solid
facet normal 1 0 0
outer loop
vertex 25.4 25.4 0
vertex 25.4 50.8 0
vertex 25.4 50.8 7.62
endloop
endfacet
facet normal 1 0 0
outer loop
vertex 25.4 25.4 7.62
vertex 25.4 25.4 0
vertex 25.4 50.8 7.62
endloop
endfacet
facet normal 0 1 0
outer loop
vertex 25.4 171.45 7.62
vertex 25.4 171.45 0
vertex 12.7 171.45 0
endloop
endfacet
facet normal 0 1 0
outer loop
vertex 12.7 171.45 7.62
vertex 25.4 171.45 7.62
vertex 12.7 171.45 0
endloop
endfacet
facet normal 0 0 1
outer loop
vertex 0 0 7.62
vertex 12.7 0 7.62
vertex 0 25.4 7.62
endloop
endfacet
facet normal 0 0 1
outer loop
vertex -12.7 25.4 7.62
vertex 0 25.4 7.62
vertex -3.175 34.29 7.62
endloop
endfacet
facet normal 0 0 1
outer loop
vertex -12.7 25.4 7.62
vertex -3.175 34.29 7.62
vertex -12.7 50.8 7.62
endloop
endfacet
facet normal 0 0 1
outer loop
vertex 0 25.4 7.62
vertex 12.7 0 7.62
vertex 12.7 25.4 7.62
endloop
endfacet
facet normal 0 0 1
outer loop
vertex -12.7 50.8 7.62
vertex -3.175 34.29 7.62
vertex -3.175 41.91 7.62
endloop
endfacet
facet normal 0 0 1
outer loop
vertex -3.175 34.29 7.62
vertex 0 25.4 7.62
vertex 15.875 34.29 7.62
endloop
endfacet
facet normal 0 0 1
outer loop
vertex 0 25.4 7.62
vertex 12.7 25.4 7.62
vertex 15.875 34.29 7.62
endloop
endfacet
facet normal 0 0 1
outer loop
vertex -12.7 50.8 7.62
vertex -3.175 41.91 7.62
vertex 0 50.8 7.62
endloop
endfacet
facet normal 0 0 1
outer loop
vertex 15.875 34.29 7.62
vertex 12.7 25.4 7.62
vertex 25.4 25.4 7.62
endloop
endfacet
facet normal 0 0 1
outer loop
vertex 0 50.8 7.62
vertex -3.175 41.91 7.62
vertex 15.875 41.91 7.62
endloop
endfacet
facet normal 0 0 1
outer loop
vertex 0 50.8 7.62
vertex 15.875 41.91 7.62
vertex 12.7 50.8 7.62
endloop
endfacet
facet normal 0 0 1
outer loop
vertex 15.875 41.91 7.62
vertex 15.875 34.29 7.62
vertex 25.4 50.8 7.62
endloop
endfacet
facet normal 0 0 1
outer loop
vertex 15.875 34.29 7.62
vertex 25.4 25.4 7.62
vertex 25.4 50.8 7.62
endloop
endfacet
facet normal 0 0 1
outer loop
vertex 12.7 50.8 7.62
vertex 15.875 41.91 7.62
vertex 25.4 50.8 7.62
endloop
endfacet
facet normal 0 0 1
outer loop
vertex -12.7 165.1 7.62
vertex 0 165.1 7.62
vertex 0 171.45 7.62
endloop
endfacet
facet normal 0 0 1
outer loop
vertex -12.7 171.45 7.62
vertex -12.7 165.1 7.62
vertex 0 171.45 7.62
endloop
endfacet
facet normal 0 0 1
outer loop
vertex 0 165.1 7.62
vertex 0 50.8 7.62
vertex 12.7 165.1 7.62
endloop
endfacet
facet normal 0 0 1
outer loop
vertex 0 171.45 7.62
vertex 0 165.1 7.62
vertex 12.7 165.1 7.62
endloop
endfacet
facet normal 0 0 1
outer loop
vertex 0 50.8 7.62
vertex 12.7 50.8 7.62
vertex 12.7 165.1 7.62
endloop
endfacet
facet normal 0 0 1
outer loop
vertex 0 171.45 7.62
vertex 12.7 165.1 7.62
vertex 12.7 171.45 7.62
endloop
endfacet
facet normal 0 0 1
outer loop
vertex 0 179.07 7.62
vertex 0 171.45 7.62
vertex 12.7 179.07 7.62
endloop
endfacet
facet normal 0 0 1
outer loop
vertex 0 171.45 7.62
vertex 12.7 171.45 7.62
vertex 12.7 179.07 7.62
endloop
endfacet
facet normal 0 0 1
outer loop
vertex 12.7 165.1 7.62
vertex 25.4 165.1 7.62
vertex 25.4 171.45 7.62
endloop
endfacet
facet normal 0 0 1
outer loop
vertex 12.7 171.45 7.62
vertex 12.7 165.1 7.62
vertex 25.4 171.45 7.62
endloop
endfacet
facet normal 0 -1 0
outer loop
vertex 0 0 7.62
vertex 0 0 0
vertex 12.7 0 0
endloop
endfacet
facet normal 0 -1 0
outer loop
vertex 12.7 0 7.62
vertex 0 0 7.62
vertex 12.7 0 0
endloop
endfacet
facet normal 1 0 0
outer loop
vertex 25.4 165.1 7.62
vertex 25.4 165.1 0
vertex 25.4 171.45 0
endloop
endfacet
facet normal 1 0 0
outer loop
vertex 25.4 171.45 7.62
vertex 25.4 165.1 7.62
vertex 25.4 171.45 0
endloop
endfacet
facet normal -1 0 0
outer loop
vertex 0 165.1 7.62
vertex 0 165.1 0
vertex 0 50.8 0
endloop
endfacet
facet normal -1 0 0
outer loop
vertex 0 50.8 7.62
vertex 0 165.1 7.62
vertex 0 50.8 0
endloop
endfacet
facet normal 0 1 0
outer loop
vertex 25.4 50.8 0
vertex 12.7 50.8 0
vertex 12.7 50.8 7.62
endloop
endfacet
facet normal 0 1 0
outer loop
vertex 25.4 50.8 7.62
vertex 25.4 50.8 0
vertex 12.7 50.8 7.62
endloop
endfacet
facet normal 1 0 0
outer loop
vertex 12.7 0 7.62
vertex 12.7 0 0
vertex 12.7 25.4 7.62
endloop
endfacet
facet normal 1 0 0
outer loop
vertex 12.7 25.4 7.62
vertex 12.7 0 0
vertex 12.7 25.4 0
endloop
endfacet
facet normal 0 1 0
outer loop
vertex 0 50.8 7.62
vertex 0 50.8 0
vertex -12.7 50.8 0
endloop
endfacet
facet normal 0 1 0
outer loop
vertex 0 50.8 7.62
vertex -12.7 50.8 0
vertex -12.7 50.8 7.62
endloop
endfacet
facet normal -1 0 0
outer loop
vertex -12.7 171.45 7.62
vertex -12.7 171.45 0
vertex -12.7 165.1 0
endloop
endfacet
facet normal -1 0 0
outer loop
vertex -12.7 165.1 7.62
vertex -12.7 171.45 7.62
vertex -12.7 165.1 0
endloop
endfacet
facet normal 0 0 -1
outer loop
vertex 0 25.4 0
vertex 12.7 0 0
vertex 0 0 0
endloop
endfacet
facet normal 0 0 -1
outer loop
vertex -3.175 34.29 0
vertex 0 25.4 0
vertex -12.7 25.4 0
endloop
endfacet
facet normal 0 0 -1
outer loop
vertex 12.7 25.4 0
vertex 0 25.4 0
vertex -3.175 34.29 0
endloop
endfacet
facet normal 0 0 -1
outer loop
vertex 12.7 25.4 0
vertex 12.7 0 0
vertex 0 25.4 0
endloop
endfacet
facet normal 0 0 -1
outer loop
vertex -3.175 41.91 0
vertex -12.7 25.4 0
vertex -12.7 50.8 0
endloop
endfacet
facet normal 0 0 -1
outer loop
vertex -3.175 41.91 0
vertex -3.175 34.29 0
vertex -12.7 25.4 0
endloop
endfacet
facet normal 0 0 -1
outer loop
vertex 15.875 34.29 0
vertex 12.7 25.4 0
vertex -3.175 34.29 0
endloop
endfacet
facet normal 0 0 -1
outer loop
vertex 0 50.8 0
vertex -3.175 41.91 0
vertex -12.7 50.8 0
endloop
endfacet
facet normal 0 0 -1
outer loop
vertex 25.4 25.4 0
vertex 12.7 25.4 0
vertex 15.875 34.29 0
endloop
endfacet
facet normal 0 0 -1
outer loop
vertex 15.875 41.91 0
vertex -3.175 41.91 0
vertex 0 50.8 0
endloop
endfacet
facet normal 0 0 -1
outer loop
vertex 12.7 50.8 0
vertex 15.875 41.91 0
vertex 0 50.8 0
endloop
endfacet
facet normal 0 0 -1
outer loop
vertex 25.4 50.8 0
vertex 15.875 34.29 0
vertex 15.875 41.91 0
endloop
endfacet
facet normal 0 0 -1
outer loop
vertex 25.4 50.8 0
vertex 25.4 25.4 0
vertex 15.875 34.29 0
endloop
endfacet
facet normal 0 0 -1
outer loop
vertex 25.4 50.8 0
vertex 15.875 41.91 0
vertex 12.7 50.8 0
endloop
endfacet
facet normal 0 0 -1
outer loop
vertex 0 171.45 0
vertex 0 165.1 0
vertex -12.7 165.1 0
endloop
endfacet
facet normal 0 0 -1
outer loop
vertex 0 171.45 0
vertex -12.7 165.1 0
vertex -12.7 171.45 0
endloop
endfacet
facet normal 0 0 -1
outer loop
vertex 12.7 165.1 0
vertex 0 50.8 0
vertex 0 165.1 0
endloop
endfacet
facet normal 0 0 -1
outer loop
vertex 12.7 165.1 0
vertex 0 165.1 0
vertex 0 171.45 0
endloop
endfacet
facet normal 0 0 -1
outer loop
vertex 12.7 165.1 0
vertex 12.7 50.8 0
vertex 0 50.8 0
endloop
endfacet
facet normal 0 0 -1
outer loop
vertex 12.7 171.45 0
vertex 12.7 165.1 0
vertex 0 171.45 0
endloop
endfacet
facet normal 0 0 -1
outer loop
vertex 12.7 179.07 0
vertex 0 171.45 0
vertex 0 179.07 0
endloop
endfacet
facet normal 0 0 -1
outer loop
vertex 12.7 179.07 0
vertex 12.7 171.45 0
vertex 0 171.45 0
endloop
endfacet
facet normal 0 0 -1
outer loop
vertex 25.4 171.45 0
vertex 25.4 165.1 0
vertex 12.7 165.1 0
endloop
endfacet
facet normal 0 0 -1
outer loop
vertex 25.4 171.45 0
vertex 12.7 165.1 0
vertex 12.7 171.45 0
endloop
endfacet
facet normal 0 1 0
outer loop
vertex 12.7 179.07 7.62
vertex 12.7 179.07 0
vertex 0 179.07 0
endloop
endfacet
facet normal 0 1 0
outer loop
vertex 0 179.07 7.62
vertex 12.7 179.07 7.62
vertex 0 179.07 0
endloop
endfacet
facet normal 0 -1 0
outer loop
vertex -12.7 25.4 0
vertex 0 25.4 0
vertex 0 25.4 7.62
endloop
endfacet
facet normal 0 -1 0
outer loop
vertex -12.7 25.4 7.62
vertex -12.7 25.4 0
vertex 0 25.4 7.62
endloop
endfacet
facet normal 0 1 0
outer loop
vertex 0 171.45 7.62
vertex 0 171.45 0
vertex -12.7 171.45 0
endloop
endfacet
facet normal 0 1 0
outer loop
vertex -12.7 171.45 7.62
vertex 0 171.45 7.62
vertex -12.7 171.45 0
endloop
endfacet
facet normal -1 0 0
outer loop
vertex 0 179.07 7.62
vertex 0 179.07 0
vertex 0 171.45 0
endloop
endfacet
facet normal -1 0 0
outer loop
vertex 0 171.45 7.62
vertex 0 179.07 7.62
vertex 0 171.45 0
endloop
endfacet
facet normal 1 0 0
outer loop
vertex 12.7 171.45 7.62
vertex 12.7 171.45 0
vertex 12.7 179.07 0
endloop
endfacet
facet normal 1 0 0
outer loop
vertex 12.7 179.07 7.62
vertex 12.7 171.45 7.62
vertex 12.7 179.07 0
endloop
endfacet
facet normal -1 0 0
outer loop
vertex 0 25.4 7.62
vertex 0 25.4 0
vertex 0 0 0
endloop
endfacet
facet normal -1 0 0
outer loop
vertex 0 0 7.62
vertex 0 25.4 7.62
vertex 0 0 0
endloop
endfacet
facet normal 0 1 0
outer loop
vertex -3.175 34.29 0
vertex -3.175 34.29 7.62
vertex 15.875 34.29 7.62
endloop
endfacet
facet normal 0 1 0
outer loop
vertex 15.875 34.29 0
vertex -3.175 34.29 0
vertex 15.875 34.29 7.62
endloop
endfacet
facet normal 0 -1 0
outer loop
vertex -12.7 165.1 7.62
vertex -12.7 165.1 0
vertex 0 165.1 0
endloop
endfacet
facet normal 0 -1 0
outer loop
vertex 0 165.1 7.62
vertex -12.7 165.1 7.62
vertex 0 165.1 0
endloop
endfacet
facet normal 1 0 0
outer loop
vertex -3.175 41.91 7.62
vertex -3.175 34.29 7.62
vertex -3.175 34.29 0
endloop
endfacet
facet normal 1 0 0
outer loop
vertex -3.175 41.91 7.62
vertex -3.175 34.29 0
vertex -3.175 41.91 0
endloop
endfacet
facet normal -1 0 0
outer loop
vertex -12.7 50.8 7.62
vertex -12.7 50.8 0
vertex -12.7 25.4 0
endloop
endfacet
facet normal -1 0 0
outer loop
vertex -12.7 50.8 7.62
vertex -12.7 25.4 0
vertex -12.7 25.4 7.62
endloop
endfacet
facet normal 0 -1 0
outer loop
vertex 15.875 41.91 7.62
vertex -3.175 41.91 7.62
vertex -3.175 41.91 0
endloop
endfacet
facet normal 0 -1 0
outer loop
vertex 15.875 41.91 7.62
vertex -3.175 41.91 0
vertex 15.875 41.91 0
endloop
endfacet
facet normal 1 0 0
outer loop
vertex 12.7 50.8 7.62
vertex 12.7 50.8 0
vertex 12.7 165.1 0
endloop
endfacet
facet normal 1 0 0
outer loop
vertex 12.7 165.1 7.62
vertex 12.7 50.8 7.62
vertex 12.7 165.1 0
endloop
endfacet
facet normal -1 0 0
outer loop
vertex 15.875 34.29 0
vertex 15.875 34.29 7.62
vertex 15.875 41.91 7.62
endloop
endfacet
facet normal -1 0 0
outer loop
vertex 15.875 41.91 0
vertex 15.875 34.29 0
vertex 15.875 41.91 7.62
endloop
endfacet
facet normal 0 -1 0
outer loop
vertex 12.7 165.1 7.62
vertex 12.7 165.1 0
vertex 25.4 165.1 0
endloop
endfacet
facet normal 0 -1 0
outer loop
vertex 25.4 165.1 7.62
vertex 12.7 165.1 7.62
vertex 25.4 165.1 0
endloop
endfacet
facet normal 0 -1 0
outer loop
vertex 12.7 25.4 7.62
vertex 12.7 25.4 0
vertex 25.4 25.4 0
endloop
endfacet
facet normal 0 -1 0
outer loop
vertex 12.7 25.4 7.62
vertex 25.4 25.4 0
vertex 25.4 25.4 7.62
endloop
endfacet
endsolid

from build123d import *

# Parameters (mm, degrees)
BOSS_EXTRUDE1_DEPTH      = 7.62
BOSS_EXTRUDE2_DEPTH      = 12.7
BOSS_EXTRUDE2_DEPTH_BACK = 25.4
SKETCH2_W                = 7.62
SKETCH2_H                = 25.4
SKETCH3_W                = 19.05
SKETCH3_H                = 7.62
CUT_EXTRUDE1_DEPTH       = 182.02289717


with BuildPart() as part:
    # Sketch1 → Boss-Extrude1 (new body)
    with BuildSketch(Plane.XY):
        Polygon((0, 0), (12.7, 0), (12.7, 165.1), (25.4, 165.1), (25.4, 171.45), (12.7, 171.45), (12.7, 179.07), (0, 179.07), (0, 171.45), (-12.7, 171.45), (-12.7, 165.1), (0, 165.1), align=None)
    extrude(amount=BOSS_EXTRUDE1_DEPTH)

    # Sketch2 → Boss-Extrude2 (add, two sides: drawn at the far end of the back side and taken through both)
    with BuildSketch(Plane.ZY.offset(-BOSS_EXTRUDE2_DEPTH_BACK)):
        with Locations((3.81, 38.1)):
            Rectangle(SKETCH2_W, SKETCH2_H)
    extrude(amount=BOSS_EXTRUDE2_DEPTH + BOSS_EXTRUDE2_DEPTH_BACK)

    # Sketch3 → Cut-Extrude1 (cut, through all)
    with BuildSketch(Plane.XY.offset(7.62)):
        with Locations((6.35, 38.1)):
            Rectangle(SKETCH3_W, SKETCH3_H)
    extrude(amount=-CUT_EXTRUDE1_DEPTH, mode=Mode.SUBTRACT)


solid = part.part
